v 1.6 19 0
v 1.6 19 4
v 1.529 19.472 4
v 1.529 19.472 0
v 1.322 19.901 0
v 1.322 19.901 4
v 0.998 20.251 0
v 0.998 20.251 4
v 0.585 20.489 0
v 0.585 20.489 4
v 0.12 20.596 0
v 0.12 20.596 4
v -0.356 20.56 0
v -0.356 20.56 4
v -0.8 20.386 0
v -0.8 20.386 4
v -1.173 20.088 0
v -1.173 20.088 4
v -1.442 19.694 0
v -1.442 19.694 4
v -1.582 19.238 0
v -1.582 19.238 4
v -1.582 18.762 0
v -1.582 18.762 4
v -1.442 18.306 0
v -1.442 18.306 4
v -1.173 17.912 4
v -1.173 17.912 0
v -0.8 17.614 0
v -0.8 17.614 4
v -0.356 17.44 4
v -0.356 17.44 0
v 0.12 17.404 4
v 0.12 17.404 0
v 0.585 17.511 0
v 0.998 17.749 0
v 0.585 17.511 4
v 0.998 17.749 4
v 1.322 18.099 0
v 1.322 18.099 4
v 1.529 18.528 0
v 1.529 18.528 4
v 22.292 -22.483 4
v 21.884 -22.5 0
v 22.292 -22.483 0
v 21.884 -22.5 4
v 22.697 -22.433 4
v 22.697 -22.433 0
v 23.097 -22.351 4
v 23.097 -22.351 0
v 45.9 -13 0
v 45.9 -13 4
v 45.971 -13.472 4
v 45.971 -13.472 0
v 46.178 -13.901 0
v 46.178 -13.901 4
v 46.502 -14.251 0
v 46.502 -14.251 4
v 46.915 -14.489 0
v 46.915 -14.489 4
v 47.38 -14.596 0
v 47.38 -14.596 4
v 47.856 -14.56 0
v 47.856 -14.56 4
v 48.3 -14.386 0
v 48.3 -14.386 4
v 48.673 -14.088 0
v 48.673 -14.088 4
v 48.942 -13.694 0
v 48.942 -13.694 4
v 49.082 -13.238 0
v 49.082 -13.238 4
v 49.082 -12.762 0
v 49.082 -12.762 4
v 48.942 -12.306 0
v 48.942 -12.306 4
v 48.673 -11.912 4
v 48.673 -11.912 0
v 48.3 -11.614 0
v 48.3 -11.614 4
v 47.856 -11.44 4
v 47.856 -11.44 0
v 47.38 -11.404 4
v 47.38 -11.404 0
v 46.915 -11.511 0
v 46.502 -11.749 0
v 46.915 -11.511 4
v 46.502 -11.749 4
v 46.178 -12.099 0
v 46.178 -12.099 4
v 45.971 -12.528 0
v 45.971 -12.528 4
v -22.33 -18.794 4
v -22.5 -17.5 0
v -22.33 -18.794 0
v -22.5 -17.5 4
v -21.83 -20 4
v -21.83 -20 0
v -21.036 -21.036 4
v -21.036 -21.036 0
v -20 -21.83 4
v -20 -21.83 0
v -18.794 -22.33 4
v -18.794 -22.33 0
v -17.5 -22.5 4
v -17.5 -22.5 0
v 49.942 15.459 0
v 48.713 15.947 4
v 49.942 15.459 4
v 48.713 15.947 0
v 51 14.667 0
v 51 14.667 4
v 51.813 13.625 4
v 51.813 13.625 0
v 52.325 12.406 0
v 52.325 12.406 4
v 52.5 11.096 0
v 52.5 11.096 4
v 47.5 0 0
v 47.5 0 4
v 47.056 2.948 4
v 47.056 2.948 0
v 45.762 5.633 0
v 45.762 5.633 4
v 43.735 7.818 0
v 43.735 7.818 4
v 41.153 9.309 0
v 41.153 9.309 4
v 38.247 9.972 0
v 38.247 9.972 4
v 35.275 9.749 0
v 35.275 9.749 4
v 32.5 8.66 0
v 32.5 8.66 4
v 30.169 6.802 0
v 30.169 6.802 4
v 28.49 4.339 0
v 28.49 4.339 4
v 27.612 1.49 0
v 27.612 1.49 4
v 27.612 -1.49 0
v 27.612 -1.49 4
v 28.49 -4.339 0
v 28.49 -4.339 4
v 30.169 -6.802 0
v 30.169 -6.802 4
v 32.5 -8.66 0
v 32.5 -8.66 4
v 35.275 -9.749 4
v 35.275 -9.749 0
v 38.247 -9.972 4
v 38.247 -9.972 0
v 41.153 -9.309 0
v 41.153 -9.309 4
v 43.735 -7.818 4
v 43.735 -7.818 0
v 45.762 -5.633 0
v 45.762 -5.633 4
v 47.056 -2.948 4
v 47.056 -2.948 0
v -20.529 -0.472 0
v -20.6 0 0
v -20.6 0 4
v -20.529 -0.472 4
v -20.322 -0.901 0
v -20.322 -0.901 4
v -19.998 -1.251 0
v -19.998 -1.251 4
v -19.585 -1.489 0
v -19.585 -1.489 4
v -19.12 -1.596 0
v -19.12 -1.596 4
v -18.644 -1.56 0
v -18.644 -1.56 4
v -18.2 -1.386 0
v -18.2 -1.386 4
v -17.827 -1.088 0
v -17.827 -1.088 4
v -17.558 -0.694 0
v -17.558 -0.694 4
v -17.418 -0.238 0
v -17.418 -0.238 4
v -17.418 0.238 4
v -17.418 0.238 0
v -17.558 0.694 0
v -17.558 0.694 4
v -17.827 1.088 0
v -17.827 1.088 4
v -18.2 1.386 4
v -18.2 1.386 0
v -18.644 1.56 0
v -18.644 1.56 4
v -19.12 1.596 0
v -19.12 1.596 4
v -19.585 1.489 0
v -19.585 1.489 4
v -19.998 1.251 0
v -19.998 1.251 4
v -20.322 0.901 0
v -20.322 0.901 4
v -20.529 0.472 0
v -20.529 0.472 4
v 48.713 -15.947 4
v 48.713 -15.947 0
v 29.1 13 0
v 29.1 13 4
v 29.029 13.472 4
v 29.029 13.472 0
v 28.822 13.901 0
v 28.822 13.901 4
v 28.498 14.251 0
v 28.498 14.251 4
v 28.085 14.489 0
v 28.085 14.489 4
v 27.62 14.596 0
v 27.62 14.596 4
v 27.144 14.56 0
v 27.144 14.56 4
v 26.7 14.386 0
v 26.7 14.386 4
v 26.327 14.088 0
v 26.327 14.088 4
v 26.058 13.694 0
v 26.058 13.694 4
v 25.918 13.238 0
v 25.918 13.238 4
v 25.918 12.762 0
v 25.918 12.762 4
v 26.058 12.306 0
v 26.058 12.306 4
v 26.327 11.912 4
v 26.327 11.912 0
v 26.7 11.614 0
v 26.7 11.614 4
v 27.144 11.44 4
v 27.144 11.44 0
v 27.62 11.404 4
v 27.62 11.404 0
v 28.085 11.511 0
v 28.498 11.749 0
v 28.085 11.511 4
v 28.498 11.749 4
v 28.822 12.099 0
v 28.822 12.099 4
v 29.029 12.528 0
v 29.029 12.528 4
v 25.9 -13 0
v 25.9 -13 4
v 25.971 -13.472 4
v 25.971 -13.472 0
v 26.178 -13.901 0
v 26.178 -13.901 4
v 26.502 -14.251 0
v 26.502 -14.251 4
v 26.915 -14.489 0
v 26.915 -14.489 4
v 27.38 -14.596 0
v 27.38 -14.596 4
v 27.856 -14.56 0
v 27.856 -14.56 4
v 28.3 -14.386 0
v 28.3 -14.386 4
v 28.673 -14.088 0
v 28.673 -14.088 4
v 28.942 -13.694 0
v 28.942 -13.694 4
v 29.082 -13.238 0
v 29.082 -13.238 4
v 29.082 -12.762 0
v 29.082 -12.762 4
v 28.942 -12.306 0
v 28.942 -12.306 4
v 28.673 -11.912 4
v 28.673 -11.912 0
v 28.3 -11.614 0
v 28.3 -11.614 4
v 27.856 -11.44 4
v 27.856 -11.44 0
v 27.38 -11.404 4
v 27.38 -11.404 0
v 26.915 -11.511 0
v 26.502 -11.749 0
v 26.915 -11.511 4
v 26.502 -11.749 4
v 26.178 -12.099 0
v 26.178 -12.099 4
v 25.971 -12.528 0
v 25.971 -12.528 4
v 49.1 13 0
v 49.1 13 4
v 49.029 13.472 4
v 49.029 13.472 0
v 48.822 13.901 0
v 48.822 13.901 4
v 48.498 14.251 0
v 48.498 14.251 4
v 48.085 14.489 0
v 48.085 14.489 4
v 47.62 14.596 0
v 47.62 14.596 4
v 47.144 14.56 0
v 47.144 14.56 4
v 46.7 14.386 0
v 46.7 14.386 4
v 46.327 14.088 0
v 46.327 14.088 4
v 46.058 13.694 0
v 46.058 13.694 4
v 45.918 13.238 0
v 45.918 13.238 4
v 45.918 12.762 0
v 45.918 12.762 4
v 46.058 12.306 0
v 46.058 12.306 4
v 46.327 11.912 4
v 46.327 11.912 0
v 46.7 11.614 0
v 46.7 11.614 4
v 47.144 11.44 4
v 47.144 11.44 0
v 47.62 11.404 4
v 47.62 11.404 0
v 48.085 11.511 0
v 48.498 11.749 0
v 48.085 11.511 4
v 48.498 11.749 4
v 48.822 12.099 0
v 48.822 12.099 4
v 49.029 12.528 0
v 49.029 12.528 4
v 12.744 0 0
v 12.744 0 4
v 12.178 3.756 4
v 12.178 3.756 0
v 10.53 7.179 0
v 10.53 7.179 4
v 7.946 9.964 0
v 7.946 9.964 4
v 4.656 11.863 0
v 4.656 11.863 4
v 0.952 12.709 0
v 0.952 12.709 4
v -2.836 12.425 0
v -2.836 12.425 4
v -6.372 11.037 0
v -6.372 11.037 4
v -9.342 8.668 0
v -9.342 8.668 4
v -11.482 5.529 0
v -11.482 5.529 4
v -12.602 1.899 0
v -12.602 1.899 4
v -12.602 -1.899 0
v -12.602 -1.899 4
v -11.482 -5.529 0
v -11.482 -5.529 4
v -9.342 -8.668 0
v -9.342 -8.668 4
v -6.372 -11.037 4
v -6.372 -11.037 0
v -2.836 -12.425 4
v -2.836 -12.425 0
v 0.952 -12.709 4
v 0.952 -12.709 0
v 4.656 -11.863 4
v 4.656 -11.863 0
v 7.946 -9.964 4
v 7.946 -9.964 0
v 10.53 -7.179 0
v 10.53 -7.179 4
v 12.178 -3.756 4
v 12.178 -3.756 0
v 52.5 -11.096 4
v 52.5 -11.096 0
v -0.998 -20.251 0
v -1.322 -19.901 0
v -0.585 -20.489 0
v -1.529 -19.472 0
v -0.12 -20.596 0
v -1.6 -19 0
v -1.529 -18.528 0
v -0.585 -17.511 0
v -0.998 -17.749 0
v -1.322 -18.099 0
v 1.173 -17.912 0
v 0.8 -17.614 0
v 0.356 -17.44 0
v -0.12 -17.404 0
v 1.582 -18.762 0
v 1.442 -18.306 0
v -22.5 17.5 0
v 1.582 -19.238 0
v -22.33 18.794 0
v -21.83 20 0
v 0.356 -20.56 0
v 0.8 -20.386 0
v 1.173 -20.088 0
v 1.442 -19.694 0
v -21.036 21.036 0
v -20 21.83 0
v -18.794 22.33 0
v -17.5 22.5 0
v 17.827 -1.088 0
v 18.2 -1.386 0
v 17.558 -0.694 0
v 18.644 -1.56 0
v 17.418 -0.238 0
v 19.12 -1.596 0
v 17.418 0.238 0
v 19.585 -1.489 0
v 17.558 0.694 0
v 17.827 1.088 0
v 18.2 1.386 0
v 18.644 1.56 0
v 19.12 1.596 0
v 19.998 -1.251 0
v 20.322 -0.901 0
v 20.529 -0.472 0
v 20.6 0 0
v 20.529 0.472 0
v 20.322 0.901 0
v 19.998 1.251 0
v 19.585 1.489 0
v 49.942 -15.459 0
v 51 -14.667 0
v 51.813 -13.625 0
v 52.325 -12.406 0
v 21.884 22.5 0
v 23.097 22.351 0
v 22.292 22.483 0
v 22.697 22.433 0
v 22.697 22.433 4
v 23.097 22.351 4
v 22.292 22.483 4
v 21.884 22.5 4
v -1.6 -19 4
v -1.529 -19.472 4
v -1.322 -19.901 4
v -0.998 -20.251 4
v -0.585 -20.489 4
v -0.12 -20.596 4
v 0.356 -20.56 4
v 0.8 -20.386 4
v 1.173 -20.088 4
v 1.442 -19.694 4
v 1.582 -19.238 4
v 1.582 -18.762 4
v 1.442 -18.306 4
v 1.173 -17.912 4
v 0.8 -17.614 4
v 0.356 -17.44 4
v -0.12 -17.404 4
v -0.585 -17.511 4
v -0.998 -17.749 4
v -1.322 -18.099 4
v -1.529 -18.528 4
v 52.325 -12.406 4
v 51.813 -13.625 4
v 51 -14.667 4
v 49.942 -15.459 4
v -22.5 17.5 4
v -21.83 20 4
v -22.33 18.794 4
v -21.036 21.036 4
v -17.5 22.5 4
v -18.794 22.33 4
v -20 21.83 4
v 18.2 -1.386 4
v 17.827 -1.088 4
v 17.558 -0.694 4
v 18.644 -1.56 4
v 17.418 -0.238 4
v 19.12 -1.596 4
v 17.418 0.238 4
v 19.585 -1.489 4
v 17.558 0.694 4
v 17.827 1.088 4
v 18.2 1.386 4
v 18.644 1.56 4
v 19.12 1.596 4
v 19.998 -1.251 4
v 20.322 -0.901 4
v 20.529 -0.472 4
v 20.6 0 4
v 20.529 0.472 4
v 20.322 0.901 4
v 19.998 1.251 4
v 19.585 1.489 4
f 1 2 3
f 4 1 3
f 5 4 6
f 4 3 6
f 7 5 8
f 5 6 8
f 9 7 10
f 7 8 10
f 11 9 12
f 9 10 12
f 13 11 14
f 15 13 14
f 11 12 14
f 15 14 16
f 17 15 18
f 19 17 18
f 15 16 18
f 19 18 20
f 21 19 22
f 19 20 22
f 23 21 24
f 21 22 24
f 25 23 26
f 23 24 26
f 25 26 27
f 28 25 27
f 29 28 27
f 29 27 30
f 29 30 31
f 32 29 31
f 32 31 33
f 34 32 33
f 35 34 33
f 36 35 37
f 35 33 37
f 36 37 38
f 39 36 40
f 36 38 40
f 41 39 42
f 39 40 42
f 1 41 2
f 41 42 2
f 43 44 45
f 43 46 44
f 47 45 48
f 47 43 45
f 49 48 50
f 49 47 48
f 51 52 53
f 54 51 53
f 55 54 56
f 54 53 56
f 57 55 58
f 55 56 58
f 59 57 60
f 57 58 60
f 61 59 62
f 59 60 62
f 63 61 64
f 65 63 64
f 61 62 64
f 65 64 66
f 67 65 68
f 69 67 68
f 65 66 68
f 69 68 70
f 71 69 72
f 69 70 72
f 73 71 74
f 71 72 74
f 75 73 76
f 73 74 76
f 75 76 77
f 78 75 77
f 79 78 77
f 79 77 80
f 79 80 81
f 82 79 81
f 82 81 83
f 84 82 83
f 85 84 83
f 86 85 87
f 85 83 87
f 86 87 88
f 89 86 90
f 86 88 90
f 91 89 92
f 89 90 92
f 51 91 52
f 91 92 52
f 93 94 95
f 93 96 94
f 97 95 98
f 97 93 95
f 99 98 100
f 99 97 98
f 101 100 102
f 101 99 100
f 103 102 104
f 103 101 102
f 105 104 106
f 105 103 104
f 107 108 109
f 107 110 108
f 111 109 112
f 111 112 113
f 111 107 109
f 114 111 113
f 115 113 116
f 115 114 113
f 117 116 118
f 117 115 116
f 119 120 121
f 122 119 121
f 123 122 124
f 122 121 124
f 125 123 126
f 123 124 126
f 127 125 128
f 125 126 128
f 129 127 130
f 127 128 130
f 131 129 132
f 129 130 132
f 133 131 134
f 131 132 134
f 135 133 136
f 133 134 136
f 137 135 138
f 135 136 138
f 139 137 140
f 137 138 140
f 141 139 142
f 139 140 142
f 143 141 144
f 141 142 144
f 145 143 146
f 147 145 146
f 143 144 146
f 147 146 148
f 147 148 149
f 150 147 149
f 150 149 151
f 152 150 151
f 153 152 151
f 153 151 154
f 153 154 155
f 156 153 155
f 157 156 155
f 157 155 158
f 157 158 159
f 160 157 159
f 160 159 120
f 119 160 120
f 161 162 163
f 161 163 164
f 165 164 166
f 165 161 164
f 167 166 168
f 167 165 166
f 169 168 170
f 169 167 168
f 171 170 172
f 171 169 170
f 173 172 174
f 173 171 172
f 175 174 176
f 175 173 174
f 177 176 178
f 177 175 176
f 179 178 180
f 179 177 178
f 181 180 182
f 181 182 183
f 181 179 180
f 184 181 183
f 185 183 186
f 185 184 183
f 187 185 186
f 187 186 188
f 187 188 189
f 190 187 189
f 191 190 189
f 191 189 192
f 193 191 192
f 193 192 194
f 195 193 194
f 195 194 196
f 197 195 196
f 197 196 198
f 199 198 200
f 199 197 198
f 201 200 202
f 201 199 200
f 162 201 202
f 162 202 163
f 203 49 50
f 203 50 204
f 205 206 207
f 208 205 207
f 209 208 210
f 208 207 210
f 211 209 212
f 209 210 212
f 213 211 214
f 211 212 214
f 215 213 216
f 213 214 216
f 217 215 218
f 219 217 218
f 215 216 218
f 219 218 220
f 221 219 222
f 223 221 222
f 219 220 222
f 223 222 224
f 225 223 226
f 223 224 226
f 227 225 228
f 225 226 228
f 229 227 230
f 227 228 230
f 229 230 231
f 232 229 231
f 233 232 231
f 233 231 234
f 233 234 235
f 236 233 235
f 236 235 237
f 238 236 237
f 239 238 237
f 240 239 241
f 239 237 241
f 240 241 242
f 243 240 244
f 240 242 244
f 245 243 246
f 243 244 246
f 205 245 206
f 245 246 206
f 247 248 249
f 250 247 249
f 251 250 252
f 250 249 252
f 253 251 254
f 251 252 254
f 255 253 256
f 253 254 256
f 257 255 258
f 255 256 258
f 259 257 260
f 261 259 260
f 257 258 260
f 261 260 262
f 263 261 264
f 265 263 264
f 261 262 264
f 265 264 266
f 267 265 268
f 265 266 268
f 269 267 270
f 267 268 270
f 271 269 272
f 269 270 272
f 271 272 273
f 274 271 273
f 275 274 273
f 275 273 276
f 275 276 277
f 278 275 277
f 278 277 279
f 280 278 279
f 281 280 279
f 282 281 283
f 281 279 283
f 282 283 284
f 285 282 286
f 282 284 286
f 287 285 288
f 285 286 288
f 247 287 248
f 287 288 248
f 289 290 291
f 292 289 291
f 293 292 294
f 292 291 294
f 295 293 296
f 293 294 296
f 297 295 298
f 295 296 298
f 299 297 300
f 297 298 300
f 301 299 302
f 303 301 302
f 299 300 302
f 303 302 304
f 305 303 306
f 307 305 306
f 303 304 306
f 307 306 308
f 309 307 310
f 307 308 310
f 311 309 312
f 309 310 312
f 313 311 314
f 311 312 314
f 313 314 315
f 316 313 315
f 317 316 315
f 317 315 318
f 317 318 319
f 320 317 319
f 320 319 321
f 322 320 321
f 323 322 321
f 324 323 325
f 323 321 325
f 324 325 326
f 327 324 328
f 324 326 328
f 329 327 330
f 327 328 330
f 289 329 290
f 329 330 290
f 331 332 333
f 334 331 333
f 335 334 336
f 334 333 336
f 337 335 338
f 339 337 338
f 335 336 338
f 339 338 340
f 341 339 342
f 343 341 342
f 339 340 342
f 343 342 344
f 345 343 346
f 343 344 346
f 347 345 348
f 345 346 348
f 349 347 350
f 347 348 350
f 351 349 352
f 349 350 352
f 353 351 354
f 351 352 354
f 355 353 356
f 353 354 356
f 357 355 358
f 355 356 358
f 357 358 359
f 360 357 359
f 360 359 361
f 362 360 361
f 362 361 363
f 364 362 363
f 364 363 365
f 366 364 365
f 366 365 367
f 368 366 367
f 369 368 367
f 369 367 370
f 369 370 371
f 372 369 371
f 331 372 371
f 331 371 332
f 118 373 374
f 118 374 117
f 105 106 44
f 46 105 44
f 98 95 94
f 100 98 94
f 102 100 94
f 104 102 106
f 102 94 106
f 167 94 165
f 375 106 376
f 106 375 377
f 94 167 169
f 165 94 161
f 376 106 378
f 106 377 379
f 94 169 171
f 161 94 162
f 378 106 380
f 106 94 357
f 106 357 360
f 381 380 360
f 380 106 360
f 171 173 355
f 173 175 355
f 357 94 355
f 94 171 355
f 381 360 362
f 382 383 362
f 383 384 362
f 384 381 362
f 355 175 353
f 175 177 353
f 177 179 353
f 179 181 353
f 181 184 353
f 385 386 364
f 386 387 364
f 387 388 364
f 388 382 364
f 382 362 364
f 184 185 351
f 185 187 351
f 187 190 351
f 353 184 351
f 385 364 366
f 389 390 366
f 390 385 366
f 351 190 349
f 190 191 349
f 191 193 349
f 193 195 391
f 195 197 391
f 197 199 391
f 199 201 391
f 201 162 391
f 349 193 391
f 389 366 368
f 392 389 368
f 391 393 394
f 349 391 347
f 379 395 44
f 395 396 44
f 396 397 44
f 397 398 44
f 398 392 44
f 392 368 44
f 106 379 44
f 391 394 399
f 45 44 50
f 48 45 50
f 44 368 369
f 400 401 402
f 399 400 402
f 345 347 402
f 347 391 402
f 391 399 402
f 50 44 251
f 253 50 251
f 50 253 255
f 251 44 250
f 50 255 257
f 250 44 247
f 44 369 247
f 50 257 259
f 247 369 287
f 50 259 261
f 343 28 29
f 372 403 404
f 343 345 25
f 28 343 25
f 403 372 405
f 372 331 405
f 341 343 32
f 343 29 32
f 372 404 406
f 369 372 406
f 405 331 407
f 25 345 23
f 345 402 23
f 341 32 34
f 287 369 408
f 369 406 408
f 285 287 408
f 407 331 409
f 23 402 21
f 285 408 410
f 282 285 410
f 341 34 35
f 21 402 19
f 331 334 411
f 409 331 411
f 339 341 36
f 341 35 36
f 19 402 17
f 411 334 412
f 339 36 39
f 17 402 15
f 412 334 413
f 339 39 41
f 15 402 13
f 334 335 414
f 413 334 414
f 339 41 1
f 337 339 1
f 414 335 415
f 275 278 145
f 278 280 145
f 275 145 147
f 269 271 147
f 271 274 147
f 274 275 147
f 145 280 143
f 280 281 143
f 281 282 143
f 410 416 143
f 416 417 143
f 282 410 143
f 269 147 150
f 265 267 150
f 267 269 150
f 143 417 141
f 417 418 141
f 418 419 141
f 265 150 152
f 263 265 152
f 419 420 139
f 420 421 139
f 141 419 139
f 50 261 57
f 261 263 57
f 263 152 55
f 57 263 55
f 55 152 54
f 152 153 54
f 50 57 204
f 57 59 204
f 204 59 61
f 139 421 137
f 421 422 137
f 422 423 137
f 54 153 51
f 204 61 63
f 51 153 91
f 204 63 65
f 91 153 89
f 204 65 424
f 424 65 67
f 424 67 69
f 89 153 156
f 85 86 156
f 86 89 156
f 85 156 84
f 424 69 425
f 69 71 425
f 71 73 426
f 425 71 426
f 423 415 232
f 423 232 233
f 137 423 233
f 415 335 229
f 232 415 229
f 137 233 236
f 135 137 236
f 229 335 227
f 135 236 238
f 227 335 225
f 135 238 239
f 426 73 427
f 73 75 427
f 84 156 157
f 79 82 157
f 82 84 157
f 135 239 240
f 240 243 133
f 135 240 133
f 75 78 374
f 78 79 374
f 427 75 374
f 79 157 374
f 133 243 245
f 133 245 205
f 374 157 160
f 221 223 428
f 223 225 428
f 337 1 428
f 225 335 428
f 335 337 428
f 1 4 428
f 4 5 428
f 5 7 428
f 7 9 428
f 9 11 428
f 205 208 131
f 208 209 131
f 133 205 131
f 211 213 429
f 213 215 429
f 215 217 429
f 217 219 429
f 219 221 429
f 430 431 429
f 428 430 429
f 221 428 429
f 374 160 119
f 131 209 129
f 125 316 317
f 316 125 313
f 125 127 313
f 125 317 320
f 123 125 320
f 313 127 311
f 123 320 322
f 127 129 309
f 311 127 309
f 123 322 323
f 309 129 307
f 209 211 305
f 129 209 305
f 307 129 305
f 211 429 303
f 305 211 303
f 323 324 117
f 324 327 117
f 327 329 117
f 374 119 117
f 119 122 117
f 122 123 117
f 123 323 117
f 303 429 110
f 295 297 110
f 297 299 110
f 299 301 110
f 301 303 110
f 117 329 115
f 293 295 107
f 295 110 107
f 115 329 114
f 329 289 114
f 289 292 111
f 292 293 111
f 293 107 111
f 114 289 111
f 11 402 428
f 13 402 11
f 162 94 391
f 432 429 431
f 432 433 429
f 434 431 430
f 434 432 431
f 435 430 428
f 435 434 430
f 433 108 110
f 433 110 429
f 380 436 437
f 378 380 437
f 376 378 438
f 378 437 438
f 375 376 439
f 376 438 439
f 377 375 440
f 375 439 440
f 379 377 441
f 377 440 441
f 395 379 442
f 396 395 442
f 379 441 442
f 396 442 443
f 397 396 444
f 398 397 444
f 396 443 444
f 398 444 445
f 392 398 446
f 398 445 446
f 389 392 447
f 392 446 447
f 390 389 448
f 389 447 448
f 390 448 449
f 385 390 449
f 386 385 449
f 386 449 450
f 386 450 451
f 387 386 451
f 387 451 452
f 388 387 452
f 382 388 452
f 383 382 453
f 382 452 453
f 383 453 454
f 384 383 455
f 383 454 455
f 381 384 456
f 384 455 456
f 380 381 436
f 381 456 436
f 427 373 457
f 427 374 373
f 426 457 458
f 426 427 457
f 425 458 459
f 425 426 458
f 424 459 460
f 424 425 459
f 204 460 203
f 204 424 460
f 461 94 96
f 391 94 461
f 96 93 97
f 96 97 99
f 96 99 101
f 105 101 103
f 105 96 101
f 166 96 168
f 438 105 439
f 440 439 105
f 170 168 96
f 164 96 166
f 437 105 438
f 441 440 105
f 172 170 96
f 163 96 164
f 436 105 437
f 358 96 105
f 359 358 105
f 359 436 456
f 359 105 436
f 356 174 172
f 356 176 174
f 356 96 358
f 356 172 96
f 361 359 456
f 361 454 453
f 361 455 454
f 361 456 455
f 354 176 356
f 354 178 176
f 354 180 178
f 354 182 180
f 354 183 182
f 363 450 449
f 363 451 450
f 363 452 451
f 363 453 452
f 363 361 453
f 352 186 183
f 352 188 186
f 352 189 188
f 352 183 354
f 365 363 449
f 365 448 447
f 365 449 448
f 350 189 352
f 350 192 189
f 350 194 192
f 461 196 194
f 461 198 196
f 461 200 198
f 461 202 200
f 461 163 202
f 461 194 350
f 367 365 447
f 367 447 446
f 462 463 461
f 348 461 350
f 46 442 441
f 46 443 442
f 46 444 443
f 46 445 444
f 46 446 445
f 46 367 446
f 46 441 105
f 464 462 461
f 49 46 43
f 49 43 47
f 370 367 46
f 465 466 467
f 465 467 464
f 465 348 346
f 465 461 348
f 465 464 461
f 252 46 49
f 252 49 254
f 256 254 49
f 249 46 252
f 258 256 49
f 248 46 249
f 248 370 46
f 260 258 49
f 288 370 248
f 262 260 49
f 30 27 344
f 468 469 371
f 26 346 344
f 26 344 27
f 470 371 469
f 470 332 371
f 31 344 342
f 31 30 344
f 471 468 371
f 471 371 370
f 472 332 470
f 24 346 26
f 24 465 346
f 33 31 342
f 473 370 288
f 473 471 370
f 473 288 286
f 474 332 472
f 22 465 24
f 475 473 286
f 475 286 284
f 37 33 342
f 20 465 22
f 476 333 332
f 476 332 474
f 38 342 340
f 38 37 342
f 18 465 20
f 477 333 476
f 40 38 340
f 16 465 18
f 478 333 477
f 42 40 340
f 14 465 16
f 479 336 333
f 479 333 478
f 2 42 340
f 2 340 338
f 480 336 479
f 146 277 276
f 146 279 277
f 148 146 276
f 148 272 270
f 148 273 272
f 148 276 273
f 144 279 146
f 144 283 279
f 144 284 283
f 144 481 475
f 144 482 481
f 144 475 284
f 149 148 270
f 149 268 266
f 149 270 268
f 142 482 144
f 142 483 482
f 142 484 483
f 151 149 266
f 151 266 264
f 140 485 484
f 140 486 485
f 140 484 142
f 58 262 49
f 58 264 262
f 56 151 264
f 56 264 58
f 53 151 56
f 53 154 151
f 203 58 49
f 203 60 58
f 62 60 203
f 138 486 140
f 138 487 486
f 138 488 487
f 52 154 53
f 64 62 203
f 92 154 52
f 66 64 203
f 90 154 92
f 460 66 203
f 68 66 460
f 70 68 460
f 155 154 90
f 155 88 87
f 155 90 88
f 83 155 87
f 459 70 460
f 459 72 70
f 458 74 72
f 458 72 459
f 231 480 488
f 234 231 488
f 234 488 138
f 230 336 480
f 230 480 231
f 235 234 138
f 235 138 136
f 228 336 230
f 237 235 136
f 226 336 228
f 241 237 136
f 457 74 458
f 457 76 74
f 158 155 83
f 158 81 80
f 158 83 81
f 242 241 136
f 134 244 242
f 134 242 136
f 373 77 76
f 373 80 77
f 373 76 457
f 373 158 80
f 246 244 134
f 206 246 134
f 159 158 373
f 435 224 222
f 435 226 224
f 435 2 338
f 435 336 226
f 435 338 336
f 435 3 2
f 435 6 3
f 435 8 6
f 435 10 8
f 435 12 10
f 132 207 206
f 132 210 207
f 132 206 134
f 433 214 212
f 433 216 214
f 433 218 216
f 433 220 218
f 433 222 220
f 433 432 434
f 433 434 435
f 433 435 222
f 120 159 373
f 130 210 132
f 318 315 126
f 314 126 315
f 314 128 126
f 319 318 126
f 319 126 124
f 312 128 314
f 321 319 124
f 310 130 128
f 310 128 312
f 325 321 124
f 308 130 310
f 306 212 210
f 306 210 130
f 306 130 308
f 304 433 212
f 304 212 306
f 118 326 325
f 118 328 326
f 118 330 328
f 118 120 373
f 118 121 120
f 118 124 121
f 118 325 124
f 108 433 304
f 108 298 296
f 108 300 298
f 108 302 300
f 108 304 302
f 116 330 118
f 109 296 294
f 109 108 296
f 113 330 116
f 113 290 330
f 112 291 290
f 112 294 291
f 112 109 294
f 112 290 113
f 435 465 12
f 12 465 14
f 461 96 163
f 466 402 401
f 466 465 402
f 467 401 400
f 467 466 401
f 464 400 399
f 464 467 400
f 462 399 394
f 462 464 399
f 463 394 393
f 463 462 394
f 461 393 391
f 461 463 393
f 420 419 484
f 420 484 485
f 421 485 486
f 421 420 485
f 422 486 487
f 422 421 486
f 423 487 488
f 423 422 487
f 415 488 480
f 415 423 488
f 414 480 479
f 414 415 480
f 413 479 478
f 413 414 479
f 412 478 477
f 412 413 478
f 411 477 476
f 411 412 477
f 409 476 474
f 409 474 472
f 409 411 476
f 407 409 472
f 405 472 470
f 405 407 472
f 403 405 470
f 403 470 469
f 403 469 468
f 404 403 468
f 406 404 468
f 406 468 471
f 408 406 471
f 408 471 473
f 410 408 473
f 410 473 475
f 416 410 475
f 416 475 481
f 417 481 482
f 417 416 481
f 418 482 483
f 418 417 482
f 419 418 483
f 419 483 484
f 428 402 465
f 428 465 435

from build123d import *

# Parameters (mm, degrees)
SKETCH_1_W          = 45
SKETCH_1_H          = 45
SKETCH_1_R          = 1.6
EXTRUDE_1_DEPTH     = 4
EXTRUDE_2_DEPTH     = 4
SKETCH_3_R          = 1.6
CUT_EXTRUDE_1_DEPTH = 4
FILLET_1_R          = 5
SKETCH_4_R          = 1.6
CUT_EXTRUDE_2_DEPTH = 4
SKETCH_5_R          = 12.744189695
SKETCH_5_R_2        = 10
CUT_EXTRUDE_3_DEPTH = 10
FILLET_2_R          = 5
FILLET_3_R          = 5


with BuildPart() as part:
    # 草图1 → 凸台-拉伸1 (new body)
    with BuildSketch(Plane.XY):
        Rectangle(SKETCH_1_W, SKETCH_1_H)
        with Locations((19, 0)):
            Circle(SKETCH_1_R, mode=Mode.SUBTRACT)
        with Locations(Location((-19, 0, 0), (0, 0, 180))):
            Circle(SKETCH_1_R, mode=Mode.SUBTRACT)
    extrude(amount=EXTRUDE_1_DEPTH)

    # 草图2 → 凸台-拉伸2 (add)
    with BuildSketch(Plane.XY.offset(4)):
        Polygon((52.5, 15), (22.5, 22.5), (22.5, 0), (52.5, 0), align=None)
        Polygon((52.5, 0), (22.5, 0), (22.5, -22.5), (52.5, -15), align=None)
    extrude(amount=-EXTRUDE_2_DEPTH)

    # 草图3 → 切除-拉伸1 (cut)
    with BuildSketch(Plane.XY.offset(4)):
        with Locations((27.5, 13)):
            Circle(SKETCH_3_R)
        with Locations((47.5, 13)):
            Circle(SKETCH_3_R)
        with Locations(Location((47.5, -13, 0), (0, 0, 180))):
            Circle(SKETCH_3_R)
        with Locations(Location((27.5, -13, 0), (0, 0, 180))):
            Circle(SKETCH_3_R)
    extrude(amount=-CUT_EXTRUDE_1_DEPTH, mode=Mode.SUBTRACT)

    # 圆角1
    fillet_1_edges = [part.edges().sort_by_distance(p)[0] for p in [
        (52.5, 15, 2),
        (52.5, -15, 2),
        (22.5, 22.5, 2),
    ]]
    fillet(fillet_1_edges, radius=FILLET_1_R)

    # 草图4 → 切除-拉伸2 (cut)
    with BuildSketch(Plane.XY.offset(4)):
        with Locations((0, 19)):
            Circle(SKETCH_4_R)
        with Locations(Location((0, -19, 0), (0, 0, 180))):
            Circle(SKETCH_4_R)
    extrude(amount=-CUT_EXTRUDE_2_DEPTH, mode=Mode.SUBTRACT)

    # 草图5 → 切除-拉伸3 (cut)
    with BuildSketch(Plane.XY.offset(4)):
        Circle(SKETCH_5_R)
        with Locations((37.5, 0)):
            Circle(SKETCH_5_R_2)
    extrude(amount=-CUT_EXTRUDE_3_DEPTH, mode=Mode.SUBTRACT)

    # 圆角2
    fillet_2_edges = [part.edges().sort_by_distance(p)[0] for p in [
        (-22.5, -22.5, 2),
        (-22.5, 22.5, 2),
    ]]
    fillet(fillet_2_edges, radius=FILLET_2_R)

    # 圆角3
    fillet_3_edges = [part.edges().sort_by_distance(p)[0] for p in [
        (22.5, -22.5, 2),
    ]]
    fillet(fillet_3_edges, radius=FILLET_3_R)


solid = part.part
